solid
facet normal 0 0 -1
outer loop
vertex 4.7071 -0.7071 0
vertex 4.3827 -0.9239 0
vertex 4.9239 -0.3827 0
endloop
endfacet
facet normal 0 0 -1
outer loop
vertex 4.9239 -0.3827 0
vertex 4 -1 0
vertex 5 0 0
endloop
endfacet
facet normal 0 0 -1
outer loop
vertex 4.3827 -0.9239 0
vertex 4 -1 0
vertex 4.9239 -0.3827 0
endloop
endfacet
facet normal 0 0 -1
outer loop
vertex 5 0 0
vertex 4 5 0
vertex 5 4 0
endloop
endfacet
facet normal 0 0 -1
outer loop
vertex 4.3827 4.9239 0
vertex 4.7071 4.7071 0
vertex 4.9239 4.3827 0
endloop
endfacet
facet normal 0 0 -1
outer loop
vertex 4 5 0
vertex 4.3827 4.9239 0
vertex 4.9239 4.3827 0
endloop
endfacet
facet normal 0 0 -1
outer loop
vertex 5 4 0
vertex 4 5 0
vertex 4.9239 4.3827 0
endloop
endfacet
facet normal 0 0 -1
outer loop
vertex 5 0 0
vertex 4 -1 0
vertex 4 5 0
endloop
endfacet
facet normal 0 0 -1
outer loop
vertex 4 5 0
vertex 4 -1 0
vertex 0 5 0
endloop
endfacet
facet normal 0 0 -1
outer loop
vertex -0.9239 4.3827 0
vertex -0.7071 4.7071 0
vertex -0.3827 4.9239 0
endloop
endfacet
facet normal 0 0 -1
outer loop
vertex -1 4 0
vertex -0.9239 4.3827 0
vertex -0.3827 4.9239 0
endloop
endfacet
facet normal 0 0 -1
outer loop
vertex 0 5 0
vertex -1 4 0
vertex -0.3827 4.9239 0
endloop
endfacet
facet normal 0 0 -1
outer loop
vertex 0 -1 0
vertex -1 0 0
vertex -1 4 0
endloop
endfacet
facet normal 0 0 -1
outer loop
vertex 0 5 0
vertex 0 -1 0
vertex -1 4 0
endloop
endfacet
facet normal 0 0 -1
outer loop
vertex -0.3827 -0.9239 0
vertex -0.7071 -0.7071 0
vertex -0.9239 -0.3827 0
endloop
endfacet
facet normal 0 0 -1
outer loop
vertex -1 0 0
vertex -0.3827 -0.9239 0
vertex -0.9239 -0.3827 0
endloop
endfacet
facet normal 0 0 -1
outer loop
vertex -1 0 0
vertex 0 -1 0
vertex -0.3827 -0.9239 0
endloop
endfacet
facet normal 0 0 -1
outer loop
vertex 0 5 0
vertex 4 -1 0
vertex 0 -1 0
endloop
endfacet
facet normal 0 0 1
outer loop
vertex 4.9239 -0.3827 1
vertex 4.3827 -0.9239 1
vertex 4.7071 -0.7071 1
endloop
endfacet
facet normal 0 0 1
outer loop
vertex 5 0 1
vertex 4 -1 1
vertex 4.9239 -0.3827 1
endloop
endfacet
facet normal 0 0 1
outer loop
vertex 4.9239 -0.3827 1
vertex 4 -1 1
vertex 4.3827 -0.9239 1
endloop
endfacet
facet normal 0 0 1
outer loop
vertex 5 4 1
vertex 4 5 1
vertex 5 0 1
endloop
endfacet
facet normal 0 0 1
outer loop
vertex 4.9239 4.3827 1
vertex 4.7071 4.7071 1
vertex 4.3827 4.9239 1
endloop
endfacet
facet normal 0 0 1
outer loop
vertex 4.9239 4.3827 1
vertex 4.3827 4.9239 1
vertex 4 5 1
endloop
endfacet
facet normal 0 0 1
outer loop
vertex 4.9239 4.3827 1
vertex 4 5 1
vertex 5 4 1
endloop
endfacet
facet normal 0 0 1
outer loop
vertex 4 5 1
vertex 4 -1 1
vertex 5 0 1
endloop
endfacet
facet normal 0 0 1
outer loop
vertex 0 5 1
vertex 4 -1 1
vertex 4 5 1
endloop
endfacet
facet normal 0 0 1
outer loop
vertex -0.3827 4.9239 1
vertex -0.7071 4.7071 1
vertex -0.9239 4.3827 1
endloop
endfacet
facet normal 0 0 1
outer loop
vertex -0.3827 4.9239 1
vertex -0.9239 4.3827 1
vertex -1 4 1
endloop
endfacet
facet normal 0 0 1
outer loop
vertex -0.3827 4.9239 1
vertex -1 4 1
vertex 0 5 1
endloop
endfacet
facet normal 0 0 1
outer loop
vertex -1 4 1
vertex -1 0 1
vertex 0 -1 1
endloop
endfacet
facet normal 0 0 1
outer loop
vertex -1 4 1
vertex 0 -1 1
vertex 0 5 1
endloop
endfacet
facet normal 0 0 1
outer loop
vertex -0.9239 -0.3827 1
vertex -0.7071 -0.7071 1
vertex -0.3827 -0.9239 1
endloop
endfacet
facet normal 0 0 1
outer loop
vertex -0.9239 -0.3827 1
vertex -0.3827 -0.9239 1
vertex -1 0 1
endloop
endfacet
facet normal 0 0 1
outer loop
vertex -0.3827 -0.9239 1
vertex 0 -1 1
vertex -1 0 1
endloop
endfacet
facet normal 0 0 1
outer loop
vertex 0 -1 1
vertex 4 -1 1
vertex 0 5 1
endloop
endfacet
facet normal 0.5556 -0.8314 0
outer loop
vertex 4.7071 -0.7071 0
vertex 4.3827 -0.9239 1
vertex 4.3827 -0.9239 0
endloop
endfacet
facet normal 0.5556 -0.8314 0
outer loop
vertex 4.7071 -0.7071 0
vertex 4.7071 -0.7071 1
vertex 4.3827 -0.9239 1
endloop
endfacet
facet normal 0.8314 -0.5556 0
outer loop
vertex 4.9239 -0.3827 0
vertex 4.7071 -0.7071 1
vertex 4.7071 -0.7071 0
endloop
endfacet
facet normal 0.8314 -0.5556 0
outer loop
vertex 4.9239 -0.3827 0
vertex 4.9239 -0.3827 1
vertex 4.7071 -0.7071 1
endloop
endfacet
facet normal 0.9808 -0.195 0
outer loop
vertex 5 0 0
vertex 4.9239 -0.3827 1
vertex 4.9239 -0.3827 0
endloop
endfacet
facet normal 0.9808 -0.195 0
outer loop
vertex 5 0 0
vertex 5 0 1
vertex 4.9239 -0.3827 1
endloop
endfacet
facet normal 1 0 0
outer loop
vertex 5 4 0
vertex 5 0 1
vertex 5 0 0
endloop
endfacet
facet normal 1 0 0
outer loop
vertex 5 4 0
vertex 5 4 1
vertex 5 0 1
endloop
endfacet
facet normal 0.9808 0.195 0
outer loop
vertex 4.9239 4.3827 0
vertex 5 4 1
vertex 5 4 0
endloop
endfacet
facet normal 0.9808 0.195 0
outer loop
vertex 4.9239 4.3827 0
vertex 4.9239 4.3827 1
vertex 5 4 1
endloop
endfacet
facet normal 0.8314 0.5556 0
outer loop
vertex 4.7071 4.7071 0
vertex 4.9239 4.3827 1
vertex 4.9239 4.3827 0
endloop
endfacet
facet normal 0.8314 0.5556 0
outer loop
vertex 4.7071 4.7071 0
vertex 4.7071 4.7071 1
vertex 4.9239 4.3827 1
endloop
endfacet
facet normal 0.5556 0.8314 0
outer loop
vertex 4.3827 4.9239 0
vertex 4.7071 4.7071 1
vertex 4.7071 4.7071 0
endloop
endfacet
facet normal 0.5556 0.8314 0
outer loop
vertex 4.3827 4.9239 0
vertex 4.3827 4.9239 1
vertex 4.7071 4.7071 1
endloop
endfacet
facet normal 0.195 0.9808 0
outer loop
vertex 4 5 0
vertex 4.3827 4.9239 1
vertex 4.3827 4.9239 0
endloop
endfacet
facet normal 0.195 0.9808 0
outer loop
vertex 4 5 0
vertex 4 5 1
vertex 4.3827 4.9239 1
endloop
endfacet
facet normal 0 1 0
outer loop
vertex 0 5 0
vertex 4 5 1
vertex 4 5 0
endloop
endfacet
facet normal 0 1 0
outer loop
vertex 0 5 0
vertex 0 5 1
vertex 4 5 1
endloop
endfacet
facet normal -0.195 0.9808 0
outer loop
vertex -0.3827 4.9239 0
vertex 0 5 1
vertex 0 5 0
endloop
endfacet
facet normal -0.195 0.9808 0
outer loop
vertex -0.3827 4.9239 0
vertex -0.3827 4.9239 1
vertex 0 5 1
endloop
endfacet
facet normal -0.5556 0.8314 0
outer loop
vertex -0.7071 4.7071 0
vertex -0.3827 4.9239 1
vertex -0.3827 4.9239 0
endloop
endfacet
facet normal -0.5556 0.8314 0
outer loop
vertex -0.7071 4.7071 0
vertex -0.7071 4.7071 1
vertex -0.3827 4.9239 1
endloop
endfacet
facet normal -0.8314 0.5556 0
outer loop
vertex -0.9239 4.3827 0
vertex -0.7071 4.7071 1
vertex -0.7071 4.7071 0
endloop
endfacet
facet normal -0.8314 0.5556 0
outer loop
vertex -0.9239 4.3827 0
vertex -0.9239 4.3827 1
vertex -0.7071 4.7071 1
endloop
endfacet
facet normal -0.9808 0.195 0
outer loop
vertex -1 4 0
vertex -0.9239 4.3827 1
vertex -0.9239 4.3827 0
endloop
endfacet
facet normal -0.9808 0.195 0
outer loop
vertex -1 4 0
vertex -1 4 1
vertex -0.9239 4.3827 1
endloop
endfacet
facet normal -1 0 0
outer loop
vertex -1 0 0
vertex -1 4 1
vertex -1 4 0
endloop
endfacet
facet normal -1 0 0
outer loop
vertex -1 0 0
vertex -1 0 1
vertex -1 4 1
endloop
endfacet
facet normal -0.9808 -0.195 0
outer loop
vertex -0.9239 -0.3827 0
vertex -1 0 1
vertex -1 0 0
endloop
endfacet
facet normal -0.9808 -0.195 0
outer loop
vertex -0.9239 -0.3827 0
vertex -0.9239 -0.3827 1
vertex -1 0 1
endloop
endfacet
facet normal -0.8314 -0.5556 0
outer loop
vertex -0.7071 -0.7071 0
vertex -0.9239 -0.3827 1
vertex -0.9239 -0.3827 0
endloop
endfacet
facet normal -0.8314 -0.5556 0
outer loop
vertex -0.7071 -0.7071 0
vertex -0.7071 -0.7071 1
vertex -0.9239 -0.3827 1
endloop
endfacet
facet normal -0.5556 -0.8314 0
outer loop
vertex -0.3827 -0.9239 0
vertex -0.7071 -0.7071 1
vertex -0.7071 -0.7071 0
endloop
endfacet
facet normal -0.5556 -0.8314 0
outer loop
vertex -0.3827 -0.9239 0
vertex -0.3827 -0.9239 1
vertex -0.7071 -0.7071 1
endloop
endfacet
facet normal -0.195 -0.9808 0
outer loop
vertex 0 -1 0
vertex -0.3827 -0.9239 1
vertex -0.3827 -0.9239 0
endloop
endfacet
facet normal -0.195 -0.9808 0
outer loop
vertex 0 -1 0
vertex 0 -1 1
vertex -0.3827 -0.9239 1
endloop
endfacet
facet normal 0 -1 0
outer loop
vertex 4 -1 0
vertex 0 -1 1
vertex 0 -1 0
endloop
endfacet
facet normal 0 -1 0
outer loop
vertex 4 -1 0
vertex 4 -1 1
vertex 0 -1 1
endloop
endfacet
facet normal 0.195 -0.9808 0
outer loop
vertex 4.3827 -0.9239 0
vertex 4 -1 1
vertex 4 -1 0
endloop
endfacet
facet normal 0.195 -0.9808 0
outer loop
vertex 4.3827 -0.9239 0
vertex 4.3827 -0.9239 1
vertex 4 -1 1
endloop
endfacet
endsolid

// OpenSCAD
// rounded offset
linear_extrude(1) offset(r = 1, $fn = 16) square(4);
